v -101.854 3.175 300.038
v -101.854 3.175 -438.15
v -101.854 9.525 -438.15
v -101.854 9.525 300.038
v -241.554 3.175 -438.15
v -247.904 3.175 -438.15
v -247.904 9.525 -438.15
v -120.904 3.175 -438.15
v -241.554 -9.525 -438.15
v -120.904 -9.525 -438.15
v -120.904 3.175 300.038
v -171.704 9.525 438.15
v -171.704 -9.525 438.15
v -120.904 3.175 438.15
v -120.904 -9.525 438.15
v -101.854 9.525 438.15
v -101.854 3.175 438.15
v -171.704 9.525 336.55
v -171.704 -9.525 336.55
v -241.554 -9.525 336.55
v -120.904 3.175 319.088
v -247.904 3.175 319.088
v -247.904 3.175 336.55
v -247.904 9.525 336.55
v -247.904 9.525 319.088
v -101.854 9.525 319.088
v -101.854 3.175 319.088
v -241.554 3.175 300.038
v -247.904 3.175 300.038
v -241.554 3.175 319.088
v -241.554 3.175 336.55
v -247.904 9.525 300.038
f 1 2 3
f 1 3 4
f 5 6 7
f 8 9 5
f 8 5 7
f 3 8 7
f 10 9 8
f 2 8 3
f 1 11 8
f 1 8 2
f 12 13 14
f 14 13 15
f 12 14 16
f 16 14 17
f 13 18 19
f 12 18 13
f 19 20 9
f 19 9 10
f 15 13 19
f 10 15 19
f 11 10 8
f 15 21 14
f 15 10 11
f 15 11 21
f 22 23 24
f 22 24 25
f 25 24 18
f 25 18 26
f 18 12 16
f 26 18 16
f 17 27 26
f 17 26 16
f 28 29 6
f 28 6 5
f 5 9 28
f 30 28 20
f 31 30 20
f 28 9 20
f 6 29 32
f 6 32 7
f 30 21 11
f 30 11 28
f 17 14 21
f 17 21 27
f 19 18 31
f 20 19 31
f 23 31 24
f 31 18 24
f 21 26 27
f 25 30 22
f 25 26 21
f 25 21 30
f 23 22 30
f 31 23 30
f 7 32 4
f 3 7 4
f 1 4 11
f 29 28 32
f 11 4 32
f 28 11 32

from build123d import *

# Parameters (mm, degrees)
F0_W     = 146.05
F0_H     = 438.15
F1_DEPTH = 9.525
F2_W     = 146.05
F2_H     = 19.05
F3_DEPTH = 6.35
F4_W     = 19.05
F4_H     = 876.3
F5_DEPTH = 12.7
F6_W     = 6.35
F6_H     = 876.3
F7_DEPTH = 12.7
F8_W     = 76.2
F8_H     = 101.6
F9_DEPTH = 19.051


with BuildPart() as f1:
    # F0 (on Front) → F1 (new body, symmetric)
    with BuildSketch(Plane.XZ):
        with Locations((-174.8789953259, 219.075)):
            Rectangle(F0_W, F0_H)
        with Locations((-174.8789953259, -219.075)):
            Rectangle(F0_W, F0_H)
    extrude(amount=F1_DEPTH, both=True)

    # F2 (on face) → F3 (cut)
    with BuildSketch(Plane(origin=(0, 9.525, 0), x_dir=(-1, 0, 0), z_dir=(0, 1, 0))):
        with Locations((174.8789953259, 309.5625)):
            Rectangle(F2_W, F2_H)
    extrude(amount=-F3_DEPTH, mode=Mode.SUBTRACT)

    # F4 (on face) → F5 (cut)
    with BuildSketch(Plane.XZ.offset(9.525)):
        with Locations((-111.3789953259, 0)):
            Rectangle(F4_W, F4_H)
    extrude(amount=-F5_DEPTH, mode=Mode.SUBTRACT)

    # F6 (on face) → F7 (cut)
    with BuildSketch(Plane.XZ.offset(9.525)):
        with Locations((-244.7289953259, 0)):
            Rectangle(F6_W, F6_H)
    extrude(amount=-F7_DEPTH, mode=Mode.SUBTRACT)

    # F8 (on face) → F9 (cut, through all)
    with BuildSketch(Plane(origin=(0, 9.525, 0), x_dir=(-1, 0, 0), z_dir=(0, 1, 0))):
        with Locations((209.8039953259, 387.35)):
            Rectangle(F8_W, F8_H)
    extrude(amount=-F9_DEPTH, mode=Mode.SUBTRACT)


solid = f1.part
